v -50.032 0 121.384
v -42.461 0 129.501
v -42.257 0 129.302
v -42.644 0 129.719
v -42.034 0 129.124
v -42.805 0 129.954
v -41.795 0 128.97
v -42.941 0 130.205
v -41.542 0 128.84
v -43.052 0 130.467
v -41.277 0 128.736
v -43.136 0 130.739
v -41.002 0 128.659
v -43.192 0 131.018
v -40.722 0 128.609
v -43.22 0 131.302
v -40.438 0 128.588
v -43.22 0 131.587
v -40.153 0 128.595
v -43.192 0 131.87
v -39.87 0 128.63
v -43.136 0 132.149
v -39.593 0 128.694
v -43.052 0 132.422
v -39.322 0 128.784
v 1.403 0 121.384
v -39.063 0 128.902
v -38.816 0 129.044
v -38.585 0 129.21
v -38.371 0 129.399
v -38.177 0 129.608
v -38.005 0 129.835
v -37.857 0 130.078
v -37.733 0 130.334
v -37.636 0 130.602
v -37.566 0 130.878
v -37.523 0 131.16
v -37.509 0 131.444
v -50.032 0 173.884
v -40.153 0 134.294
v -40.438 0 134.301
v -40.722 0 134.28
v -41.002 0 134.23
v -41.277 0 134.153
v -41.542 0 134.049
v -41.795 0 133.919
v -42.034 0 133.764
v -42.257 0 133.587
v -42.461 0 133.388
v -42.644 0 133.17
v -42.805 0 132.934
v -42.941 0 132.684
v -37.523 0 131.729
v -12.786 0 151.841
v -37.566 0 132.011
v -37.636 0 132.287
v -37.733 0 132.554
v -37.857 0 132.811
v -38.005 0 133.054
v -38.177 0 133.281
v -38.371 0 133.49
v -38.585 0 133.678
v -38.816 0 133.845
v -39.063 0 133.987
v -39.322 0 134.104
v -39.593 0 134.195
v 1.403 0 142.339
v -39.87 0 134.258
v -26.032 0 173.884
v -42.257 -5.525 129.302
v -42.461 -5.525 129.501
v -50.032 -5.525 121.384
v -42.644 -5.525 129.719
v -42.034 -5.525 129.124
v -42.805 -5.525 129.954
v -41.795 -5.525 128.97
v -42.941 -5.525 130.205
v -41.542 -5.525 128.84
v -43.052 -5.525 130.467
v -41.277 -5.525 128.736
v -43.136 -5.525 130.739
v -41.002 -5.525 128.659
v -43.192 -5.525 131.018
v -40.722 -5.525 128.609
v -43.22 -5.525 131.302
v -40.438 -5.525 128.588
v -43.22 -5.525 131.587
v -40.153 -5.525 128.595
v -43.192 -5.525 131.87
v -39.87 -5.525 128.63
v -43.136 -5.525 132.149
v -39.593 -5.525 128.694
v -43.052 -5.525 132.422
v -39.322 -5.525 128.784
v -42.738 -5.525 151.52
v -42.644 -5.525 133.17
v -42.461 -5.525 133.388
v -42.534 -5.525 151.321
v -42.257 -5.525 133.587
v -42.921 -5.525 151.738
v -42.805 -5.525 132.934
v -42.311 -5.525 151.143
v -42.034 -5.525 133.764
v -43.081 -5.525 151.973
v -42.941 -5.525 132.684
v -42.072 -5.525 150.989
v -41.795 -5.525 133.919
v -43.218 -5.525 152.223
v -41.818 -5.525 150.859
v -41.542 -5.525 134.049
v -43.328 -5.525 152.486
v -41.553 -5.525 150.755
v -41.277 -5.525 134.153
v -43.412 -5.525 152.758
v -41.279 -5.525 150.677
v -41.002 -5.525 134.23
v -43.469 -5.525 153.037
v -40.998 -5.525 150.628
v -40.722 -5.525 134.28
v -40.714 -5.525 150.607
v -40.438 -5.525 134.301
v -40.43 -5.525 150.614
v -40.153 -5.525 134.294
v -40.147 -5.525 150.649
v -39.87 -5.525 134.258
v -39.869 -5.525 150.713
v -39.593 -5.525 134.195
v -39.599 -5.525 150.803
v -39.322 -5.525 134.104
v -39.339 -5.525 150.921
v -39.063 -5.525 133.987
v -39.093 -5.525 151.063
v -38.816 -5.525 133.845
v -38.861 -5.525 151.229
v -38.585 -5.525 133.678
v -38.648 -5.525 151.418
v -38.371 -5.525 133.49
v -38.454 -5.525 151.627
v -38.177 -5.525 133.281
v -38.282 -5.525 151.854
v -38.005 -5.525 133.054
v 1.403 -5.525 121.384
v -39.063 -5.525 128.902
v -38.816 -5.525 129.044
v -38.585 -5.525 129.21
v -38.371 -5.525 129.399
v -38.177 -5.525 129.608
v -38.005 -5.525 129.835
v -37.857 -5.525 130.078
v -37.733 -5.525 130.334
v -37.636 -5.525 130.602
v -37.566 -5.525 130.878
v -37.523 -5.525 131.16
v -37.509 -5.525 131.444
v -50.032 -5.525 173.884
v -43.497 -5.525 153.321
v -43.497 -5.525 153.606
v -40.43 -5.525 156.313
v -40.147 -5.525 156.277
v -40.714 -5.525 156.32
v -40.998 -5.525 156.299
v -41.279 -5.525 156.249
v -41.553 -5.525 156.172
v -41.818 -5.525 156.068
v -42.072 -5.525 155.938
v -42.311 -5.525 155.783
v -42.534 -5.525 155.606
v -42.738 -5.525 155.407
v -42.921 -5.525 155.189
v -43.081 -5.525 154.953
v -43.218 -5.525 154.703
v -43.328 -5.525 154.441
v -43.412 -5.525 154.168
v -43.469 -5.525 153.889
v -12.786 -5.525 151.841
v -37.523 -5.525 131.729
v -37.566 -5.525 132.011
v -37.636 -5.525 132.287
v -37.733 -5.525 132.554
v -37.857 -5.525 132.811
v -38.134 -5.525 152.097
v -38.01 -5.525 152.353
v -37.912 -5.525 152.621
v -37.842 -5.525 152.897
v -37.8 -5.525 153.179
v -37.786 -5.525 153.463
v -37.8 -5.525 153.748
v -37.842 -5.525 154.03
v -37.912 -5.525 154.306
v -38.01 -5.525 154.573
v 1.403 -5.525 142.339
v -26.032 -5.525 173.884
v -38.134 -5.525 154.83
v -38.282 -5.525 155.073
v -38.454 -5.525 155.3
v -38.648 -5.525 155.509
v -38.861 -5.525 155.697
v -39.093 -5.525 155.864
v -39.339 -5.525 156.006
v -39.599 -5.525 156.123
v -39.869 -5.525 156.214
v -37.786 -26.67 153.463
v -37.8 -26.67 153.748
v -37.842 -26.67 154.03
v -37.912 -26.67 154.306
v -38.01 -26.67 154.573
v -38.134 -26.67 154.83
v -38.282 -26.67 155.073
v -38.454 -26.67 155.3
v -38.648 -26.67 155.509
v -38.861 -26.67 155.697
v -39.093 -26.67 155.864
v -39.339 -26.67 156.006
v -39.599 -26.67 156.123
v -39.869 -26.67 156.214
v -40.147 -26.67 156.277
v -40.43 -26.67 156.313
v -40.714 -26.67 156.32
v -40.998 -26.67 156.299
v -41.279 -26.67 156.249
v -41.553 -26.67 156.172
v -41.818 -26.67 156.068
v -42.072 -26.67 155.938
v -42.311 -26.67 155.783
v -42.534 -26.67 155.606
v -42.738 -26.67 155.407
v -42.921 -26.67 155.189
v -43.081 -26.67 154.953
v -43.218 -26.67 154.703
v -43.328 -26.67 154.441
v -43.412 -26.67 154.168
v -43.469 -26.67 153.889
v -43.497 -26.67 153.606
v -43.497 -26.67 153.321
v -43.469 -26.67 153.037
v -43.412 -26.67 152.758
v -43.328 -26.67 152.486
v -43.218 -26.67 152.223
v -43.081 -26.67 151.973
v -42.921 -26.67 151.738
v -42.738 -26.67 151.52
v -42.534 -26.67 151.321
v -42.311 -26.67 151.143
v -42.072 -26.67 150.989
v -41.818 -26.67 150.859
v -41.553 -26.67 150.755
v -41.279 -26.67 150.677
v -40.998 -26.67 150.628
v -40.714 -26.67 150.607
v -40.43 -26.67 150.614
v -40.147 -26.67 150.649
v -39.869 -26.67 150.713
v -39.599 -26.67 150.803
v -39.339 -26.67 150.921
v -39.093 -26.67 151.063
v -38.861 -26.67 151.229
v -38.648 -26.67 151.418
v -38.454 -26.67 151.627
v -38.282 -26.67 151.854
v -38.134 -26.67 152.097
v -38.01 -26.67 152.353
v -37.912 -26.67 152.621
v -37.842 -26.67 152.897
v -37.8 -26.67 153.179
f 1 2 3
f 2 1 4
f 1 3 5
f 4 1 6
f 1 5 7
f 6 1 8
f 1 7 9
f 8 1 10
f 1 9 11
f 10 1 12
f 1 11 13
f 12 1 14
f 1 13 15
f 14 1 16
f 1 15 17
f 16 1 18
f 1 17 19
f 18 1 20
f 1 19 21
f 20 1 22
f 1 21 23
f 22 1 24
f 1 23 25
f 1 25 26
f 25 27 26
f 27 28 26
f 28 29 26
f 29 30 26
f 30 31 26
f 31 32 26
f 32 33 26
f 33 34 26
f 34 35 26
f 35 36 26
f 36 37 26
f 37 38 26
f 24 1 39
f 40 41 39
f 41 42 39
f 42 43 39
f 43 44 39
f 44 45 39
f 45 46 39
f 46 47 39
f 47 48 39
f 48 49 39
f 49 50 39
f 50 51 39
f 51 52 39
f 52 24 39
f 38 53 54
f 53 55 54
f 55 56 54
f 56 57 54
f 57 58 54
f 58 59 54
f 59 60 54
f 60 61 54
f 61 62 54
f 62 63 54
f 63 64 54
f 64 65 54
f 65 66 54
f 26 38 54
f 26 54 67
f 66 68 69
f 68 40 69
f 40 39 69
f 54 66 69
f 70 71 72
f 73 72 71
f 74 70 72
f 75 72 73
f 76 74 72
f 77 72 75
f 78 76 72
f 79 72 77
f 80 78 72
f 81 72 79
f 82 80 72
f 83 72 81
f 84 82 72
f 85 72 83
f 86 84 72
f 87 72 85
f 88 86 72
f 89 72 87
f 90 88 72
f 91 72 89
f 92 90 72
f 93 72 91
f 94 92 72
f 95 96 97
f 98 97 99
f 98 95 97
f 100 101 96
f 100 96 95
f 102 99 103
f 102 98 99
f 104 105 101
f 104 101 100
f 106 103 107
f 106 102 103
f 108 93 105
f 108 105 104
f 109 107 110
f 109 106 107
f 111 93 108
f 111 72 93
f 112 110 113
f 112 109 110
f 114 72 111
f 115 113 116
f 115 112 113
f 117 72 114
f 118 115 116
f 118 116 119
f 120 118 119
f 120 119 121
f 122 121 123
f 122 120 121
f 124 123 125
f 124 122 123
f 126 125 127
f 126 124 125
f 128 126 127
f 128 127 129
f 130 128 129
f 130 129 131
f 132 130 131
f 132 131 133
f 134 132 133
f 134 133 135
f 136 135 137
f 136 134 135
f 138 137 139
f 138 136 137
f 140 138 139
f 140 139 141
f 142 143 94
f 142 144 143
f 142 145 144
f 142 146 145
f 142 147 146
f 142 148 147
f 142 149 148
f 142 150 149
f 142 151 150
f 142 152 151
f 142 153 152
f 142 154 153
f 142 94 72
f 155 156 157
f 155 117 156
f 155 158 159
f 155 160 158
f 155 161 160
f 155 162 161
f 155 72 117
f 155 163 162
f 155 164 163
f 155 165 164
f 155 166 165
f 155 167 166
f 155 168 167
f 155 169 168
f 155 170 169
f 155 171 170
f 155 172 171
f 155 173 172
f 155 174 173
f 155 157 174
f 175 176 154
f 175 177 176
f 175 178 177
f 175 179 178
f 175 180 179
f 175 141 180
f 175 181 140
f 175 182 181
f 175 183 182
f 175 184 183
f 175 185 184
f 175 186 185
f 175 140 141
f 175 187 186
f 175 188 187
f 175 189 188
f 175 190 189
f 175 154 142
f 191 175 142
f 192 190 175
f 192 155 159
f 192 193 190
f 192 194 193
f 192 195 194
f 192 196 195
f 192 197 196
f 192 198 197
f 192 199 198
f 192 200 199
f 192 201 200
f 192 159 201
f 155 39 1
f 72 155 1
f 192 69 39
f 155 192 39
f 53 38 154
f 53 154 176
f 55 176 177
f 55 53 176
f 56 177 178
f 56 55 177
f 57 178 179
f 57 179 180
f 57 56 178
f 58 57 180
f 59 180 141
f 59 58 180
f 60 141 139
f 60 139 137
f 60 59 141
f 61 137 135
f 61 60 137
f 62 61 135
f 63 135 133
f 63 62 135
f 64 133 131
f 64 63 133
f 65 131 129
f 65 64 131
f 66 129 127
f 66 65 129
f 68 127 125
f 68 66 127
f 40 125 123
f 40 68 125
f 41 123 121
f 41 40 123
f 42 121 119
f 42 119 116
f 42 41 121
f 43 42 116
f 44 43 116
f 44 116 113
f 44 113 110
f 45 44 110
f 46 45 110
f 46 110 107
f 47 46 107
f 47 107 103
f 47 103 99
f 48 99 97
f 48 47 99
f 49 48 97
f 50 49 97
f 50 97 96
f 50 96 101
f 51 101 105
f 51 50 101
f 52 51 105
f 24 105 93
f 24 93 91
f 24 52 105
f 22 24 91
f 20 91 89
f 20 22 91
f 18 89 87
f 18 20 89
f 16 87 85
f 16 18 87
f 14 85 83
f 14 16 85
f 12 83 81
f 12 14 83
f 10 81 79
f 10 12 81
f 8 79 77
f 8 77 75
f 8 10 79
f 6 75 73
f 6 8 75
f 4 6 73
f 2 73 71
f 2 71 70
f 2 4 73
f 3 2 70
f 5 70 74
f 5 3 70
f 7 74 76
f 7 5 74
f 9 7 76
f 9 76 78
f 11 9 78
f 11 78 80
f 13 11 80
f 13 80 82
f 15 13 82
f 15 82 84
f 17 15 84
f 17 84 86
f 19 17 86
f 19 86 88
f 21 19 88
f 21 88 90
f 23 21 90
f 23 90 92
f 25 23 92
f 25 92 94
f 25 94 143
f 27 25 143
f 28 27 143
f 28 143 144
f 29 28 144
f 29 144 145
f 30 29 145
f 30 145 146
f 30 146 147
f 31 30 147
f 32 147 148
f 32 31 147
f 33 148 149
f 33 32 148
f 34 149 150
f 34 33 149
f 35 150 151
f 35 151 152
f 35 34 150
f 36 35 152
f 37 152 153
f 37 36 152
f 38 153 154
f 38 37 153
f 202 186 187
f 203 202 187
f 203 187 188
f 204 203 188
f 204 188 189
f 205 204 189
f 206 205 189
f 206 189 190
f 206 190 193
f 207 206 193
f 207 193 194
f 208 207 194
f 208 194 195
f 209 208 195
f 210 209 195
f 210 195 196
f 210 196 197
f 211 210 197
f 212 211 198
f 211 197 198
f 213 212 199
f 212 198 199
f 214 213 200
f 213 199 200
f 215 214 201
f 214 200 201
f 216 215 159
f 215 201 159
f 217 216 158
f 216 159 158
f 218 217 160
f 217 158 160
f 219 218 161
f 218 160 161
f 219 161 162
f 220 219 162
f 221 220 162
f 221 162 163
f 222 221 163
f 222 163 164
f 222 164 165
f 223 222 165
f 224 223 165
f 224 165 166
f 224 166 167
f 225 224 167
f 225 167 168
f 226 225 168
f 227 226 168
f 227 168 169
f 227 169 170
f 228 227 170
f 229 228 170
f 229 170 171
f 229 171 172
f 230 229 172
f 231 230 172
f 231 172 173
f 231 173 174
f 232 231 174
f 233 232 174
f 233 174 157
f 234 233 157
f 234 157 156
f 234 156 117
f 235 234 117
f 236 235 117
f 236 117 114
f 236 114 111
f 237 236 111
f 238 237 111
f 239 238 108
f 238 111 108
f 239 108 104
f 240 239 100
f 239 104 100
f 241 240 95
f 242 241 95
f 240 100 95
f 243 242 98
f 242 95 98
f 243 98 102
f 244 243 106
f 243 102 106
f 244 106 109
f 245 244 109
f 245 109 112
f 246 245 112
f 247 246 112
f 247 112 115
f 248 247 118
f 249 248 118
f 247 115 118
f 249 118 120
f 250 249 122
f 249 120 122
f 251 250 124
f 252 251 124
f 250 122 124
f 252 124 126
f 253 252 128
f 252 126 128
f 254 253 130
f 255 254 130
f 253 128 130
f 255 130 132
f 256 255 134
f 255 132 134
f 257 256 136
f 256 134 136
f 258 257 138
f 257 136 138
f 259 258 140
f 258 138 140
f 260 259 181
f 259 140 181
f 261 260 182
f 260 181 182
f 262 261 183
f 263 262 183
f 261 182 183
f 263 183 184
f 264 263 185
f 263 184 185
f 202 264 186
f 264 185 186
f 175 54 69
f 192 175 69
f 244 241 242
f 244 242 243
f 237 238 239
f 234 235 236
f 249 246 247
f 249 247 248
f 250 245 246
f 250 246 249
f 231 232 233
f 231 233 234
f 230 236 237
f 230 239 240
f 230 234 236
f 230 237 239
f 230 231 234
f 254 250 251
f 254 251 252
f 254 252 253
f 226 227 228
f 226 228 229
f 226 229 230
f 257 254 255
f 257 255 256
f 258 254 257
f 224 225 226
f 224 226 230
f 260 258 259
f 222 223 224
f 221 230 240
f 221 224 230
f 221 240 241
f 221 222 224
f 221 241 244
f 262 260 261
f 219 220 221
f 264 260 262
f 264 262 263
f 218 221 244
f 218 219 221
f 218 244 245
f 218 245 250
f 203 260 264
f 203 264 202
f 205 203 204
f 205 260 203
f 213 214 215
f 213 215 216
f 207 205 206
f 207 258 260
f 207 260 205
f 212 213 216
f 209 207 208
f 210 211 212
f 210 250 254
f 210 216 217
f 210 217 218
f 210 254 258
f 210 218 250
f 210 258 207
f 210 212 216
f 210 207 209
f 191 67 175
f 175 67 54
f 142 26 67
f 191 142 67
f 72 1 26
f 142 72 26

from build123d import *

# Parameters (mm, degrees)
F0_R     = 0.381
F1_DEPTH = 0.7366
F2_DEPTH = 3.556
F3_SCALE = 7.5


with BuildPart() as f1:
    # F0 (on Front) → F1 (new body)
    with BuildSketch(Plane.XZ):
        Polygon((-3.4709807732, 23.1845746487), (-6.6709807732, 23.1845746487), (-6.6709807732, 16.1845746487), (0.1870192268, 16.1845746487), (0.1870192268, 18.9785746487), (-1.704775727, 20.2454317916), align=None)
        with Locations((-5.3821913898, 17.5259150565)):
            Circle(F0_R, mode=Mode.SUBTRACT)
        with Locations((-5.4190722294, 20.4617753625)):
            Circle(F0_R, mode=Mode.SUBTRACT)
    extrude(amount=F1_DEPTH)

    # F0 (on Front) → F2 (join)
    with BuildSketch(Plane.XZ):
        with Locations((-5.4190722294, 20.4617753625)):
            Circle(F0_R)
    extrude(amount=F2_DEPTH)


with BuildPart() as f1_1:
    # F3: moved
    add(f1.part.scale(F3_SCALE))


solid = f1_1.part
